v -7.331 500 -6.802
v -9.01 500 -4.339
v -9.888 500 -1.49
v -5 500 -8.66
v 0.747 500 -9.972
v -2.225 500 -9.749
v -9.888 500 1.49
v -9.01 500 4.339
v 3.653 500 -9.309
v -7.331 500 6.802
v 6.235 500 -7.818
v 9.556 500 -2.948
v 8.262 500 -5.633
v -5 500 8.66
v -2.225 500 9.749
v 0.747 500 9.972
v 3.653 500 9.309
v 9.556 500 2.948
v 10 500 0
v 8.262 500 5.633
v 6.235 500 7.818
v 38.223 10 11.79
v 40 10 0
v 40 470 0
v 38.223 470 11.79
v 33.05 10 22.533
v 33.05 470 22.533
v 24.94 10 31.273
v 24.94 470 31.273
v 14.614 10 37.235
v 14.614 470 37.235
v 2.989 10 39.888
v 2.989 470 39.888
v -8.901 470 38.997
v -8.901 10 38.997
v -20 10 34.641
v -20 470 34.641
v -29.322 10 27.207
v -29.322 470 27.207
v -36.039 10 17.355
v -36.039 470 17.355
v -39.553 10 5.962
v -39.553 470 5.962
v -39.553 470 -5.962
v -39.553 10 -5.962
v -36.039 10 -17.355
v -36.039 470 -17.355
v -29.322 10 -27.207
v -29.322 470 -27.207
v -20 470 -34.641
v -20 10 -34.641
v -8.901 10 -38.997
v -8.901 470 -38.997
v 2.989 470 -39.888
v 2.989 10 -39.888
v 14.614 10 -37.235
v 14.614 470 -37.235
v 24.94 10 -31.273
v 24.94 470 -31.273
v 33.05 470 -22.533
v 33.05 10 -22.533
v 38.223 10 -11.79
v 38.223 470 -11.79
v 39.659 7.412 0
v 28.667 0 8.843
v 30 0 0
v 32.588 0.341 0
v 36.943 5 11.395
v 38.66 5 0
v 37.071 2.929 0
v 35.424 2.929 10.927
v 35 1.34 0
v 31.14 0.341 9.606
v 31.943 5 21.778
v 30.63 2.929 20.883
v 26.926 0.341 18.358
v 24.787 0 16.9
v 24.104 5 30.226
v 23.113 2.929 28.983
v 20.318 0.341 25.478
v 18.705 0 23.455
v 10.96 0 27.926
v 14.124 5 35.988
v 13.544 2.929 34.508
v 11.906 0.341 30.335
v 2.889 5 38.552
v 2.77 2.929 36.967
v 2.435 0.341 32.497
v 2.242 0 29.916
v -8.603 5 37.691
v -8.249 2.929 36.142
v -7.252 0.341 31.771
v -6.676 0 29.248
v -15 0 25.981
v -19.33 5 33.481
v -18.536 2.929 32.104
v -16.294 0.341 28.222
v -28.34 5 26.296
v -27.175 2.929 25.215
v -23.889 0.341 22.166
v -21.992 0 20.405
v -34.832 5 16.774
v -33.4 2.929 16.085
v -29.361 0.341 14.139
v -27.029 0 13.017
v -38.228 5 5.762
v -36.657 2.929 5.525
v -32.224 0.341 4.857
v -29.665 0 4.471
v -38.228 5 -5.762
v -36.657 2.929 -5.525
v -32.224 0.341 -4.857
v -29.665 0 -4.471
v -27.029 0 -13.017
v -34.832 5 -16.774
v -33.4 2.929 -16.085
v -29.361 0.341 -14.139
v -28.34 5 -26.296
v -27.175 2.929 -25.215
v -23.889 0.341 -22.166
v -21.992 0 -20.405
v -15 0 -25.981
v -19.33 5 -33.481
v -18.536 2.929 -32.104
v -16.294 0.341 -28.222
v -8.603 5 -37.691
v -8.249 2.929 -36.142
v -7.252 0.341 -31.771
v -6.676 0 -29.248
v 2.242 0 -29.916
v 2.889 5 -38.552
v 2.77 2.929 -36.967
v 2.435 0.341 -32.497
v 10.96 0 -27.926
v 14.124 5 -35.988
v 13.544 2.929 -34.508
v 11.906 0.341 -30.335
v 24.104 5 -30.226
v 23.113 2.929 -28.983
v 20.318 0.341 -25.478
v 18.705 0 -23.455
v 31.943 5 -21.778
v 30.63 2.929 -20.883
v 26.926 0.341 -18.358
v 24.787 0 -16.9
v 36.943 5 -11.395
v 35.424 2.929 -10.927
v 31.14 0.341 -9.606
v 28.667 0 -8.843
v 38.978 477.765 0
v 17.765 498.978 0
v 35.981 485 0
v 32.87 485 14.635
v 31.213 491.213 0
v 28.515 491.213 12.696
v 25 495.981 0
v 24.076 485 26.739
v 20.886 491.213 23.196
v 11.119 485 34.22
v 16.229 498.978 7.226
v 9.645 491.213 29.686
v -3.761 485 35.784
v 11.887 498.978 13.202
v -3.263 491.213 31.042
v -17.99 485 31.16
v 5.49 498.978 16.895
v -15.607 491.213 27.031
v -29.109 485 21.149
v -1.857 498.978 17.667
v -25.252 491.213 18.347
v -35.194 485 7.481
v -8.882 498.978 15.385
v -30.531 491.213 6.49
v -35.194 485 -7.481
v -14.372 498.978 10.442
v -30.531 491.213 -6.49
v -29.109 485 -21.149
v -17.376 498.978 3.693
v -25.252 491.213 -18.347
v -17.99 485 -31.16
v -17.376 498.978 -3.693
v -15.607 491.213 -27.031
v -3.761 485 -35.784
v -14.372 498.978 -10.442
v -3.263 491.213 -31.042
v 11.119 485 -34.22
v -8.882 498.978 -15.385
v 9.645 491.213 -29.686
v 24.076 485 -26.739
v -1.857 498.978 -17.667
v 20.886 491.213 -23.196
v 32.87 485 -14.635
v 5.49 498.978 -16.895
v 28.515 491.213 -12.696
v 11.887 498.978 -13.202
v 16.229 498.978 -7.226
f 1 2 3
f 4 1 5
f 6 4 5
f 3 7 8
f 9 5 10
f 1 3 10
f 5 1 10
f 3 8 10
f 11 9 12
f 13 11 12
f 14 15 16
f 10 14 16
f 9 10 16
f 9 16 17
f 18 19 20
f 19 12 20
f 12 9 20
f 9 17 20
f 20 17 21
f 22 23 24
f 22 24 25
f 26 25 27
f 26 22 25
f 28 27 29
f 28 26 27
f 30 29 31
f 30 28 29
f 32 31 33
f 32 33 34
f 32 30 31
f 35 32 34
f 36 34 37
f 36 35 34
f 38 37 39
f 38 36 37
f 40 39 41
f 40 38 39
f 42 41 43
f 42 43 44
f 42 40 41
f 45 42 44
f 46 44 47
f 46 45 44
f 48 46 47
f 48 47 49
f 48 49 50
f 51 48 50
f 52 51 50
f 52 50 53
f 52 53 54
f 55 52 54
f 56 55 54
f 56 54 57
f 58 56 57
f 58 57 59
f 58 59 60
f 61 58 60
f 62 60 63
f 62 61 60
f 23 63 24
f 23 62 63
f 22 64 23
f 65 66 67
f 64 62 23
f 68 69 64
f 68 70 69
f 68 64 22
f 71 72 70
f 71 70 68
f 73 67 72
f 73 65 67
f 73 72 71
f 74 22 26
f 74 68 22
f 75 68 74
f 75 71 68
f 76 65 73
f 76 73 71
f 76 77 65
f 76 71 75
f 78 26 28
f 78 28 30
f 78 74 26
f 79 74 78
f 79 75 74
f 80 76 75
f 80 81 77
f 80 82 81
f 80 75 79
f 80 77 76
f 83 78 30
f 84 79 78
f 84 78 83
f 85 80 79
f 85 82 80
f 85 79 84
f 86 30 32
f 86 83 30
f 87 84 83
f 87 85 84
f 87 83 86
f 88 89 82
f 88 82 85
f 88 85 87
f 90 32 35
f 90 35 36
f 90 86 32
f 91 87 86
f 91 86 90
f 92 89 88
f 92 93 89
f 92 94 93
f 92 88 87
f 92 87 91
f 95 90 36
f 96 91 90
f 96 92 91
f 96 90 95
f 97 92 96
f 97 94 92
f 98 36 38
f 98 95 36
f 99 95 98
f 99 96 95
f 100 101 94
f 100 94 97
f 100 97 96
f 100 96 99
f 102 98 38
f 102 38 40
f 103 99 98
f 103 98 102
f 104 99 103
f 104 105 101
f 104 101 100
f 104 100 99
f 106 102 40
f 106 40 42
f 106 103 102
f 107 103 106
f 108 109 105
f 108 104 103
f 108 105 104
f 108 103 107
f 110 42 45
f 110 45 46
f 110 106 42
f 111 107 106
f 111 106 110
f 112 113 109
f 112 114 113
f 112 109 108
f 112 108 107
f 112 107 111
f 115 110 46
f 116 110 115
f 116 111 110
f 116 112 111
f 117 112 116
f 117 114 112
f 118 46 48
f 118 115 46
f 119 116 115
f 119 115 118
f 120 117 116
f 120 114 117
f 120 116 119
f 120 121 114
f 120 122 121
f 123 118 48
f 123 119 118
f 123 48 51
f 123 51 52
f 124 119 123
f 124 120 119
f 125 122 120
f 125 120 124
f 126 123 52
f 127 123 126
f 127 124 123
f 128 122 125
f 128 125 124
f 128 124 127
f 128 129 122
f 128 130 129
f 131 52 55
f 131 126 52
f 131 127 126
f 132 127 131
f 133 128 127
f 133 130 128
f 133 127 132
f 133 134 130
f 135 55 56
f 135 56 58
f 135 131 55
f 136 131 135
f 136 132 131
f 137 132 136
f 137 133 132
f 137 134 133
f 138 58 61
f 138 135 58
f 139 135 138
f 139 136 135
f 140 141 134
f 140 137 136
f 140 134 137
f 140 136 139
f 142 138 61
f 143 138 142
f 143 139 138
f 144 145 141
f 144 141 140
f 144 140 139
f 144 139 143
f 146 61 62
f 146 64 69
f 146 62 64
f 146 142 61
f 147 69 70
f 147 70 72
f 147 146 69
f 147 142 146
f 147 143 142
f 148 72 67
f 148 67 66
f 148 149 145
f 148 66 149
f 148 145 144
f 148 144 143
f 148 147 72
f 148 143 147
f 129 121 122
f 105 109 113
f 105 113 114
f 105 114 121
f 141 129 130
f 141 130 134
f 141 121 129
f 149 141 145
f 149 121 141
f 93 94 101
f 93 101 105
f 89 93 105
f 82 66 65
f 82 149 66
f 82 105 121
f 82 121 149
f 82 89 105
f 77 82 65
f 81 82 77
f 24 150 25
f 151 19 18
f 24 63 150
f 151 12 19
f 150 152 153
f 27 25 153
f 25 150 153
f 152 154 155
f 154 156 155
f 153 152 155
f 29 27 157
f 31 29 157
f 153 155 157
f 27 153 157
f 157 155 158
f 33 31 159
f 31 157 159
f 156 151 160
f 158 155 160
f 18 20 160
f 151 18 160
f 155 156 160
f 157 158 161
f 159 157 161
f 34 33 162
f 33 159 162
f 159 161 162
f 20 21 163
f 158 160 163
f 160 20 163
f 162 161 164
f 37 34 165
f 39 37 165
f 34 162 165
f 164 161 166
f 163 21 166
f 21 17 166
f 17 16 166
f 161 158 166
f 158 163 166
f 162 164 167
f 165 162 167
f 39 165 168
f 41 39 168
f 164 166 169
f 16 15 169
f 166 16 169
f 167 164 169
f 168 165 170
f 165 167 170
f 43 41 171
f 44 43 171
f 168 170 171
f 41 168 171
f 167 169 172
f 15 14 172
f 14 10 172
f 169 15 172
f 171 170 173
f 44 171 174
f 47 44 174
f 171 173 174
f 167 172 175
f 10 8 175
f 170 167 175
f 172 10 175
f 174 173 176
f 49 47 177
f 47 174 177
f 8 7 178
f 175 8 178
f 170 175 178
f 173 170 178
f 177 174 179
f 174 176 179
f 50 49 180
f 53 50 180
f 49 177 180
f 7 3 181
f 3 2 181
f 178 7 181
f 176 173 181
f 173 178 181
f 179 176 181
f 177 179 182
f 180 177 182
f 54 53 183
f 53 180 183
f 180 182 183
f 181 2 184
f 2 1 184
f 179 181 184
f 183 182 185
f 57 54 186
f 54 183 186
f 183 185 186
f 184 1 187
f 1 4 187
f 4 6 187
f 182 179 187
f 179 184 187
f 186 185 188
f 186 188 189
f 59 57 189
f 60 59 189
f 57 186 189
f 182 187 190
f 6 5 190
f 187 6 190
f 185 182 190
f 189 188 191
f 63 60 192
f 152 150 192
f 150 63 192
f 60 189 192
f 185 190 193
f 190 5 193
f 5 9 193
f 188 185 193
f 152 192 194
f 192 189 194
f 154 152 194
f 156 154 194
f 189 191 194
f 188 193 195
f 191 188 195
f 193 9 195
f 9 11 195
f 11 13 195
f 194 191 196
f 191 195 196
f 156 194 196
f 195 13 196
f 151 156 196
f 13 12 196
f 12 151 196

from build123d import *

# Parameters (mm, degrees)
F0_R     = 40
F1_DEPTH = 500
F2_R     = 30
F3_R     = 10


with BuildPart() as f1:
    # F0 (on Front) → F1 (new body)
    with BuildSketch(Plane.XZ):
        Circle(F0_R)
    extrude(amount=-F1_DEPTH)

    # F2
    f2_edges = [f1.edges().sort_by_distance(p)[0] for p in [
        (-40, 500, 0),
    ]]
    fillet(f2_edges, radius=F2_R)

    # F3
    f3_edges = [f1.edges().sort_by_distance(p)[0] for p in [
        (-40, 0, 0),
    ]]
    fillet(f3_edges, radius=F3_R)


solid = f1.part
